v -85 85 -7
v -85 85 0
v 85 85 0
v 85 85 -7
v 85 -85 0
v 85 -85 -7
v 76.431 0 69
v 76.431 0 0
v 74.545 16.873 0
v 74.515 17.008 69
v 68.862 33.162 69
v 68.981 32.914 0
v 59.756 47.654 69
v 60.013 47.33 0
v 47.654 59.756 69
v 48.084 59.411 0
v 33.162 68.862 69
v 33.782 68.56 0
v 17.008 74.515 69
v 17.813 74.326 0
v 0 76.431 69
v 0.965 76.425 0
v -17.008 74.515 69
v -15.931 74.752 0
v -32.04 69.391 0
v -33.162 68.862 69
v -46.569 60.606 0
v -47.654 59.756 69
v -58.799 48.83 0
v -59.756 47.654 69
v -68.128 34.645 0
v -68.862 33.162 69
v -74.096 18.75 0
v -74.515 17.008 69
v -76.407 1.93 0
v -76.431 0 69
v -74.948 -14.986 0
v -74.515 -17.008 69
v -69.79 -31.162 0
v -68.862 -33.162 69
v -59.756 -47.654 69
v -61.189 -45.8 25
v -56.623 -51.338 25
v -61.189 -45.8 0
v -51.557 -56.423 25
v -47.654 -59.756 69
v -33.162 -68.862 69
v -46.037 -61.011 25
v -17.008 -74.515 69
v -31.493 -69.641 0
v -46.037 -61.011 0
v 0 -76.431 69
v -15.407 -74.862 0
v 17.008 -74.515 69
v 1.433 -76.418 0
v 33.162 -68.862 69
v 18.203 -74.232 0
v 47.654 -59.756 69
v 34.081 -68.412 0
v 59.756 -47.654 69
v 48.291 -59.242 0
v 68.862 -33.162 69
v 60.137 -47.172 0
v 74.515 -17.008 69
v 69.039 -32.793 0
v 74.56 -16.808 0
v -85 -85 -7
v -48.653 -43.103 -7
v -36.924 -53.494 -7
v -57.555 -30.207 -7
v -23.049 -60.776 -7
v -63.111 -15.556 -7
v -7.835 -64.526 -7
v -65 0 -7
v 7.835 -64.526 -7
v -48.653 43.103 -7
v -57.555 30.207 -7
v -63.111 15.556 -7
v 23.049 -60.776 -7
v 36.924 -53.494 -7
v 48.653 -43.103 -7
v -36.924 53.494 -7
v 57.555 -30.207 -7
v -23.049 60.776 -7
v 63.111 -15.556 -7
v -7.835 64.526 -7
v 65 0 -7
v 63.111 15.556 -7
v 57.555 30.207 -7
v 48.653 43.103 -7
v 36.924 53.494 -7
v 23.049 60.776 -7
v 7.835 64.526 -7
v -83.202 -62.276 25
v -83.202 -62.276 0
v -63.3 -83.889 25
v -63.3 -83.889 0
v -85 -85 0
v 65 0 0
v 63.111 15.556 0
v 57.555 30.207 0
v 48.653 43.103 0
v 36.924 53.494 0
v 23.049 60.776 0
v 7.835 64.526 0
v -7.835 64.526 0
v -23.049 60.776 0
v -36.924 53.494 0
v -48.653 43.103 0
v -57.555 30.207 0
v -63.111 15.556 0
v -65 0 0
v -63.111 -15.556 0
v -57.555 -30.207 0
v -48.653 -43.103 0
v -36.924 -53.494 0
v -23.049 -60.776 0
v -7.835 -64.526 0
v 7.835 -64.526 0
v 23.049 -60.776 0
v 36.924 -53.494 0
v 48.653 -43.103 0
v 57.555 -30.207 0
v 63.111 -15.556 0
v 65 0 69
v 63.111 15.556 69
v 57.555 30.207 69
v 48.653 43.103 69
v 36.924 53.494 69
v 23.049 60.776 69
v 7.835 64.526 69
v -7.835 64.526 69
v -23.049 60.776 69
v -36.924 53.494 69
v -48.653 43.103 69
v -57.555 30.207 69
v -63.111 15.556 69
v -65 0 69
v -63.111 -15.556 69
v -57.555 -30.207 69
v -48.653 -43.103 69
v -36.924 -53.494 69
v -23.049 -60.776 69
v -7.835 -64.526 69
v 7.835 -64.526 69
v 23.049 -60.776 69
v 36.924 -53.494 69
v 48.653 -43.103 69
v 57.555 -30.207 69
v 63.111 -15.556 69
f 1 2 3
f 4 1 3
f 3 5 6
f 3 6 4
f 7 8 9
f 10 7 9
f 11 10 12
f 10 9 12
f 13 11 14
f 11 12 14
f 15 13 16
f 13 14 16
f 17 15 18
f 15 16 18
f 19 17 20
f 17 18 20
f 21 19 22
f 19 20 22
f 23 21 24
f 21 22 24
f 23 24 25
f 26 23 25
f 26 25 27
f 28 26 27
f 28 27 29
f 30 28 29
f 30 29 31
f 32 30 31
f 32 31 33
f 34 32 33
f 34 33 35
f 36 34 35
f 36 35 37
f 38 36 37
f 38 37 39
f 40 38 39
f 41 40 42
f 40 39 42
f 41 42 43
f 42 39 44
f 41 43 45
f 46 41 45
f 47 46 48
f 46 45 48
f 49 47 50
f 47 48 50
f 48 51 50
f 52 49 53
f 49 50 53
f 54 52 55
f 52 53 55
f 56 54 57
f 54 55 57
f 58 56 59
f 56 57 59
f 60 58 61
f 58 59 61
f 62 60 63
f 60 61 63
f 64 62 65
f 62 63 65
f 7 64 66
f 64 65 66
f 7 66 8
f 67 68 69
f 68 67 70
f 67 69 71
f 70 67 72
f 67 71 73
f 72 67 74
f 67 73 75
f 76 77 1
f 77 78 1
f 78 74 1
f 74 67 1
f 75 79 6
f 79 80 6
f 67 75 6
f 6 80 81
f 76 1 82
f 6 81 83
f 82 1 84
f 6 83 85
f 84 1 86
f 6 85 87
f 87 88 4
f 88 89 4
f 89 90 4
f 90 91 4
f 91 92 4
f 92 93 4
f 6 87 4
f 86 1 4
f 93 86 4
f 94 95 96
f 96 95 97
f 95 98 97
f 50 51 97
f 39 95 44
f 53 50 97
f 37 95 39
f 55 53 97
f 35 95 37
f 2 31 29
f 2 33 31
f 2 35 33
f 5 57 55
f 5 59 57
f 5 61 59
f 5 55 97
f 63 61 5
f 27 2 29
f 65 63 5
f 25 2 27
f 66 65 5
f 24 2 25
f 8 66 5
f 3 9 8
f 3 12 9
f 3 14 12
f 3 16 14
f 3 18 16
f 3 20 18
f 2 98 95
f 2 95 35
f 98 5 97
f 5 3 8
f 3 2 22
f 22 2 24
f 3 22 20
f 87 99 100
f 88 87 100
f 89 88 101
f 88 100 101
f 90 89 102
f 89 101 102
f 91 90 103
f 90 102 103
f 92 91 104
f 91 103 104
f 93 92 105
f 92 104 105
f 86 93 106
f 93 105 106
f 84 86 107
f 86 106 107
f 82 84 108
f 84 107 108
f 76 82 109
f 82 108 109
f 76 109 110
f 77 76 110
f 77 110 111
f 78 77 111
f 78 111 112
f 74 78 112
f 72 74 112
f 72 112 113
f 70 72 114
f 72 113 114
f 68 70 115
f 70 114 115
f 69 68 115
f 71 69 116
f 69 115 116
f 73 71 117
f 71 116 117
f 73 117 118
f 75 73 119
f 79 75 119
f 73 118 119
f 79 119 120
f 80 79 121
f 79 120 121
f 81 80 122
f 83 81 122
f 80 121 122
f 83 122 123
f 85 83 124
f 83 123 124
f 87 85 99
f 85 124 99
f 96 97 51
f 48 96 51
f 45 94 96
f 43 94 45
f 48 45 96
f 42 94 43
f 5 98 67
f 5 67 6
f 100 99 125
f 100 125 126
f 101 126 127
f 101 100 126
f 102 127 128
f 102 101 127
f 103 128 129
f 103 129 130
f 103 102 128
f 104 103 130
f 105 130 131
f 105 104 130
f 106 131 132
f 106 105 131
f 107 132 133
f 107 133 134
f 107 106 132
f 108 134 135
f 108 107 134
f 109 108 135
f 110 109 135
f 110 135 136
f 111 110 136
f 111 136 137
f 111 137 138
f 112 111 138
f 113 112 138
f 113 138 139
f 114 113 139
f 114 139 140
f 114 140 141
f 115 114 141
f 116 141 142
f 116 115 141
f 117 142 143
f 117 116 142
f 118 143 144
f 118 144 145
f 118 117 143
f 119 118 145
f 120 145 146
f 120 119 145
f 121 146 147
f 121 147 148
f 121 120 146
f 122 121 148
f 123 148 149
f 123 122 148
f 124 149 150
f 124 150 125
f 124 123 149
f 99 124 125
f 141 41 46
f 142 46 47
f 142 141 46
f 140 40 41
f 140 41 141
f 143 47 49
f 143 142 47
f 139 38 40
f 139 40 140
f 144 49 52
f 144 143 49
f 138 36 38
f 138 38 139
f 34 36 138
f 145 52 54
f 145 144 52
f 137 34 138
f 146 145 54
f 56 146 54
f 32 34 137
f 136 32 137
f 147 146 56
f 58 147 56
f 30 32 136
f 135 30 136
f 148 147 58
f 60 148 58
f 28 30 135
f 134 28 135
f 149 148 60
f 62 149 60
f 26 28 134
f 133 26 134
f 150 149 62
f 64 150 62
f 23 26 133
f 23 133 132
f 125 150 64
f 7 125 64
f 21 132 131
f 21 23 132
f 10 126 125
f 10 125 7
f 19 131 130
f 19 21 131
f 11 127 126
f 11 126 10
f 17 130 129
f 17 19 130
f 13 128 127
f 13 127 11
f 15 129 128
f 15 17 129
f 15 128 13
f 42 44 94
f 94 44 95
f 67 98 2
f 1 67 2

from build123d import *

# Parameters (mm, degrees)
F0_R     = 76.431145
F0_R_2   = 65
F1_DEPTH = 69
F0_W     = 170
F0_H     = 170
F2_DEPTH = 7
F4_DEPTH = 25


with BuildPart() as f1:
    # F0 (on Top) → F1 (new body)
    with BuildSketch(Plane.XY):
        Circle(F0_R)
        Circle(F0_R_2, mode=Mode.SUBTRACT)
    extrude(amount=F1_DEPTH)

    # F0 (on Top) → F2 (join)
    with BuildSketch(Plane.XY):
        Rectangle(F0_W, F0_H)
        Circle(F0_R, mode=Mode.SUBTRACT)
        Circle(F0_R)
        Circle(F0_R_2, mode=Mode.SUBTRACT)
    extrude(amount=-F2_DEPTH)

    # F3 (on face) → F4 (join)
    with BuildSketch(Plane.XY):
        with BuildLine():
            ThreePointArc((-46.036632, -61.011052), (-54.149607, -53.940152), (-61.189011, -45.799835))
            Line((-61.189011, -45.799835), (-83.201844, -62.276389))
            Line((-83.201844, -62.276389), (-63.29952, -83.889073))
            Line((-63.29952, -83.889073), (-46.036632, -61.011052))
        make_face()
    extrude(amount=F4_DEPTH)


solid = f1.part
